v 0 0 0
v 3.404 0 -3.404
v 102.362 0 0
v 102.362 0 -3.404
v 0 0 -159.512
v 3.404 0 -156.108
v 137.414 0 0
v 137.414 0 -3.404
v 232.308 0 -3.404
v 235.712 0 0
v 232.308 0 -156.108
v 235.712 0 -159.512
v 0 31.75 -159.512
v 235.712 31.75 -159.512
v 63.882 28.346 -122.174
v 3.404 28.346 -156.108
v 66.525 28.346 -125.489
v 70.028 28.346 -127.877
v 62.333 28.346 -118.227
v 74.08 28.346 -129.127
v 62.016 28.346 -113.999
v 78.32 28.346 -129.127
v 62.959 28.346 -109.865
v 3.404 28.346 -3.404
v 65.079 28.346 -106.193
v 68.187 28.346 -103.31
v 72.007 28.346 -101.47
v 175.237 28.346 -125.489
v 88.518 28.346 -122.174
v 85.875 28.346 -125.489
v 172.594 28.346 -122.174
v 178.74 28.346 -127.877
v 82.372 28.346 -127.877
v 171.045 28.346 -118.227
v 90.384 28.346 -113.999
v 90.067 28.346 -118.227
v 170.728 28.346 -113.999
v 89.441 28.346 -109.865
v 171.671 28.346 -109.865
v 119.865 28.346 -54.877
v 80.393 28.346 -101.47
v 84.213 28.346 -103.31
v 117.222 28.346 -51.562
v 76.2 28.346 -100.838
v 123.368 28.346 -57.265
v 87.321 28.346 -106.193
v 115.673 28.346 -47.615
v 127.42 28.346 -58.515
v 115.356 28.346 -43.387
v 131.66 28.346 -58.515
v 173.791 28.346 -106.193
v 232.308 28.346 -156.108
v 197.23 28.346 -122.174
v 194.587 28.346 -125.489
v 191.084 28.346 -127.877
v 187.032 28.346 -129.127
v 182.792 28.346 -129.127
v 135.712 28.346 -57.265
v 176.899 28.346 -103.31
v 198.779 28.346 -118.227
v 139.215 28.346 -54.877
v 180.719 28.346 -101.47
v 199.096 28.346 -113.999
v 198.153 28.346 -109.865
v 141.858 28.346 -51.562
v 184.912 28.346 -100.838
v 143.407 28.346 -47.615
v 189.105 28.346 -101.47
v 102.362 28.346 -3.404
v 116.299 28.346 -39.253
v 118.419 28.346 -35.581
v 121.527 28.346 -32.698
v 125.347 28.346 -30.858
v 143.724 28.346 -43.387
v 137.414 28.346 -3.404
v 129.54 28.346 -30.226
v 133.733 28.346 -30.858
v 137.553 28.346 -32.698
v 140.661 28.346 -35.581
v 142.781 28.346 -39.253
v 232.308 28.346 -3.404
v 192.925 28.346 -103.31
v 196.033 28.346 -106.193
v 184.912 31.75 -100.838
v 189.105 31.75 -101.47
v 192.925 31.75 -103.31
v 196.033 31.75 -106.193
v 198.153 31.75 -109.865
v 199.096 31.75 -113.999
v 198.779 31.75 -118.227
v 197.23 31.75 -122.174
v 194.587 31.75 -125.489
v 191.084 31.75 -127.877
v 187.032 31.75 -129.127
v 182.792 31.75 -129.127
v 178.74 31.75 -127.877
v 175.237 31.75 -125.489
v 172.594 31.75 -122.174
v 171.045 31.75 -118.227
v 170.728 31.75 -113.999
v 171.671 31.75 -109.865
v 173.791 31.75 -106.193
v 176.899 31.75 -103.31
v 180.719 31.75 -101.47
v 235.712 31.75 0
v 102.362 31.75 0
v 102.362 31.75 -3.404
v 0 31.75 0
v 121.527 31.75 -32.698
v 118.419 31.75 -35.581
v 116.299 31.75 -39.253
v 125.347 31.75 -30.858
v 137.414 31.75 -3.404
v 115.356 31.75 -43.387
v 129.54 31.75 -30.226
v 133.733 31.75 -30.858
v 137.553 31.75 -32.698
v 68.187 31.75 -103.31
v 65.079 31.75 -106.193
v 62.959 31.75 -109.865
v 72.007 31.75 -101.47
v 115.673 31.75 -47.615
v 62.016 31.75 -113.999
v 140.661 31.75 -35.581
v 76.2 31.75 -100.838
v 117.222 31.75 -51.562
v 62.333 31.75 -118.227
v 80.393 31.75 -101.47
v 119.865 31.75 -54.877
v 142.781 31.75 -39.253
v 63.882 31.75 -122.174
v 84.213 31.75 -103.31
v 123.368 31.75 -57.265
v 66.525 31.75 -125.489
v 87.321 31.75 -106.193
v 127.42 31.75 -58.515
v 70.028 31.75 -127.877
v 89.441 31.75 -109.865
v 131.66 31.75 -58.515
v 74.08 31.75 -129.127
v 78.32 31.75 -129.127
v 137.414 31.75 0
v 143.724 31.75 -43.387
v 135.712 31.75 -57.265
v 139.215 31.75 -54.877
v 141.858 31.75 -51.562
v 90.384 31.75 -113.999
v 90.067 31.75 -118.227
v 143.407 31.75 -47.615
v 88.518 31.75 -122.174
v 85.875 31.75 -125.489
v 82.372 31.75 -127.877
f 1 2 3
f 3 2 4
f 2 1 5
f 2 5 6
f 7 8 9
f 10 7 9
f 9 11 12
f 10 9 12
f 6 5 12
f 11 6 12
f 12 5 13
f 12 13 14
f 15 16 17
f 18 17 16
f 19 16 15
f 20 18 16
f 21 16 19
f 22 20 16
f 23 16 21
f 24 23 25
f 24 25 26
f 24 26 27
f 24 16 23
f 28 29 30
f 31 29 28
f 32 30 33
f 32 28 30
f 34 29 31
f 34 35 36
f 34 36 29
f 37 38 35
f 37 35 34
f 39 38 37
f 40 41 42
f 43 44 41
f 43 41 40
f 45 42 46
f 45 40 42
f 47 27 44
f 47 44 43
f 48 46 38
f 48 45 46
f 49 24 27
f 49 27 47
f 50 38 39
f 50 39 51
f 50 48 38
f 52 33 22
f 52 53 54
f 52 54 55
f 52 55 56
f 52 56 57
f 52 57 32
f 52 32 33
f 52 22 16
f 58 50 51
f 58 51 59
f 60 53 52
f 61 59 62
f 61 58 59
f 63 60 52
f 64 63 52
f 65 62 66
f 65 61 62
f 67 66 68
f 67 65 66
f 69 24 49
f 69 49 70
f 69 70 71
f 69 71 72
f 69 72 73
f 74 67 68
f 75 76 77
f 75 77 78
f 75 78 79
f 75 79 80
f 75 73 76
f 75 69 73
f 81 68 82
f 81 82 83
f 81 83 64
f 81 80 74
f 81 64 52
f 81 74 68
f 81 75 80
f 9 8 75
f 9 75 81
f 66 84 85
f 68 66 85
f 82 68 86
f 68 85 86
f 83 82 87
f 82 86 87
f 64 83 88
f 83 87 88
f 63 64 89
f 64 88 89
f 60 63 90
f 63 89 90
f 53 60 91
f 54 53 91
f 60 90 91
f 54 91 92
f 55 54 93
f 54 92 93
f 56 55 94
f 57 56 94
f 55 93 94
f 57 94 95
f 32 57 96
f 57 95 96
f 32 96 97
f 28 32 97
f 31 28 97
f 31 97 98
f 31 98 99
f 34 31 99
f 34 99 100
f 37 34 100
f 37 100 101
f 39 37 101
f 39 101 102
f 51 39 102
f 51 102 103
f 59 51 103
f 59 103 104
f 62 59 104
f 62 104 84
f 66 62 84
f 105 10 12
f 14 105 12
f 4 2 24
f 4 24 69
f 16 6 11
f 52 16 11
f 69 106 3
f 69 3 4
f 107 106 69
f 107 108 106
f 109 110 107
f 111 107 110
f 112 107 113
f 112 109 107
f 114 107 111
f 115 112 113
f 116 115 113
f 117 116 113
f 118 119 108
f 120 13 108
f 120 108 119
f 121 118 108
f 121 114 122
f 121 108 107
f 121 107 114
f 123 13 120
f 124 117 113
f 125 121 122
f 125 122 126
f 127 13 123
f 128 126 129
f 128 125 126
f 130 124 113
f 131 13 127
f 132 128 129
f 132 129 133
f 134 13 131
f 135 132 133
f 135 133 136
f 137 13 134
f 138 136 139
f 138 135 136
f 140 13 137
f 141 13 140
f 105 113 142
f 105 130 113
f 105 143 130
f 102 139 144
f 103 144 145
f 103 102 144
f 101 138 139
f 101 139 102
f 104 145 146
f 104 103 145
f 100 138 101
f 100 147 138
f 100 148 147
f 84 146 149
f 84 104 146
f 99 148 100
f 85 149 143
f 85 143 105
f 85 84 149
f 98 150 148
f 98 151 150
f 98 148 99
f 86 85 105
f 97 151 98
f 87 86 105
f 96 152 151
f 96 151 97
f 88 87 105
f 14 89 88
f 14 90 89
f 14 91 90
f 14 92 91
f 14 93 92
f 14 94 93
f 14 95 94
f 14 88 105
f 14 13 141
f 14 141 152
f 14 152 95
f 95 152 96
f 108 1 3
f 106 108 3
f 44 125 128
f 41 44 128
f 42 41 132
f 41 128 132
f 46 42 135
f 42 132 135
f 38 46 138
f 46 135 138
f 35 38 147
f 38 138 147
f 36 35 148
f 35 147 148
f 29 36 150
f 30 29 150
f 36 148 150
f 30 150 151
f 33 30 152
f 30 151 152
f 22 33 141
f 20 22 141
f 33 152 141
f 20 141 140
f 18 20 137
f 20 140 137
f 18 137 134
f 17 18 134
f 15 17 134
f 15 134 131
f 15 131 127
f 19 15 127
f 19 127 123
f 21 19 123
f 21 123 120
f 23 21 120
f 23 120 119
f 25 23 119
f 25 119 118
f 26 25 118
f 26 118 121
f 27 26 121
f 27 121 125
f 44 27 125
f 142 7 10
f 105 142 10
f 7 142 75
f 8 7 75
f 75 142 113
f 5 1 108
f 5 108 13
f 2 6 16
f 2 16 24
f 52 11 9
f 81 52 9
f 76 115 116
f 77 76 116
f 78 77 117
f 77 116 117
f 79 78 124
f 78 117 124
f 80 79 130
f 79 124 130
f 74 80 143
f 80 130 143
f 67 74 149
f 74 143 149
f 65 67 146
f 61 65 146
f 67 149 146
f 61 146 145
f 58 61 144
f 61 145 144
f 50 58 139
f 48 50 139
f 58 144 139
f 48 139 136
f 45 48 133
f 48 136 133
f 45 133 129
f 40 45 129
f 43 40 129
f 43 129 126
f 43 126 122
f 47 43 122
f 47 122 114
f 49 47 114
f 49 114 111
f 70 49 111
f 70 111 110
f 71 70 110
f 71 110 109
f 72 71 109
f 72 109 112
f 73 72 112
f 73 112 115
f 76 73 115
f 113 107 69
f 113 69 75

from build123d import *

# Parameters (mm, degrees)
SKETCH1_W           = 235.712
SKETCH1_H           = 159.512
BOSS_EXTRUDE1_DEPTH = 31.75
SKETCH2_W           = 228.9048
SKETCH2_H           = 152.7048
CUT_EXTRUDE1_DEPTH  = 28.3464
SKETCH3_W           = 35.052
SKETCH3_H           = 3.4036
CUT_EXTRUDE2_DEPTH  = 287.377875521
SKETCH4_R           = 14.224
CUT_EXTRUDE3_DEPTH  = 287.377875521


with BuildPart() as part:
    # Sketch1 → Boss-Extrude1 (new body)
    with BuildSketch(Plane(origin=(0, 0, 0), x_dir=(1, 0, 0), z_dir=(0, 1, 0))):
        with Locations((117.856, 79.756)):
            Rectangle(SKETCH1_W, SKETCH1_H)
    extrude(amount=BOSS_EXTRUDE1_DEPTH)

    # Sketch2 → Cut-Extrude1 (cut)
    with BuildSketch(Plane.XZ):
        with Locations((117.856, -79.756)):
            Rectangle(SKETCH2_W, SKETCH2_H)
    extrude(amount=-CUT_EXTRUDE1_DEPTH, mode=Mode.SUBTRACT)

    # Sketch3 → Cut-Extrude2 (cut, through all)
    with BuildSketch(Plane(origin=(0, 31.75, 0), x_dir=(1, 0, 0), z_dir=(0, 1, 0))):
        with Locations((119.888, 1.7018)):
            Rectangle(SKETCH3_W, SKETCH3_H)
    extrude(amount=-CUT_EXTRUDE2_DEPTH, mode=Mode.SUBTRACT)

    # Sketch4 → Cut-Extrude3 (cut, through all)
    with BuildSketch(Plane(origin=(0, 31.75, 0), x_dir=(1, 0, 0), z_dir=(0, 1, 0))):
        with Locations(Location((76.2, 115.062, 0), (0, 0, 270))):
            Circle(SKETCH4_R)
        with Locations(Location((129.54, 44.45, 0), (0, 0, 270))):
            Circle(SKETCH4_R)
        with Locations(Location((184.912, 115.062, 0), (0, 0, 270))):
            Circle(SKETCH4_R)
    extrude(amount=-CUT_EXTRUDE3_DEPTH, mode=Mode.SUBTRACT)


solid = part.part
